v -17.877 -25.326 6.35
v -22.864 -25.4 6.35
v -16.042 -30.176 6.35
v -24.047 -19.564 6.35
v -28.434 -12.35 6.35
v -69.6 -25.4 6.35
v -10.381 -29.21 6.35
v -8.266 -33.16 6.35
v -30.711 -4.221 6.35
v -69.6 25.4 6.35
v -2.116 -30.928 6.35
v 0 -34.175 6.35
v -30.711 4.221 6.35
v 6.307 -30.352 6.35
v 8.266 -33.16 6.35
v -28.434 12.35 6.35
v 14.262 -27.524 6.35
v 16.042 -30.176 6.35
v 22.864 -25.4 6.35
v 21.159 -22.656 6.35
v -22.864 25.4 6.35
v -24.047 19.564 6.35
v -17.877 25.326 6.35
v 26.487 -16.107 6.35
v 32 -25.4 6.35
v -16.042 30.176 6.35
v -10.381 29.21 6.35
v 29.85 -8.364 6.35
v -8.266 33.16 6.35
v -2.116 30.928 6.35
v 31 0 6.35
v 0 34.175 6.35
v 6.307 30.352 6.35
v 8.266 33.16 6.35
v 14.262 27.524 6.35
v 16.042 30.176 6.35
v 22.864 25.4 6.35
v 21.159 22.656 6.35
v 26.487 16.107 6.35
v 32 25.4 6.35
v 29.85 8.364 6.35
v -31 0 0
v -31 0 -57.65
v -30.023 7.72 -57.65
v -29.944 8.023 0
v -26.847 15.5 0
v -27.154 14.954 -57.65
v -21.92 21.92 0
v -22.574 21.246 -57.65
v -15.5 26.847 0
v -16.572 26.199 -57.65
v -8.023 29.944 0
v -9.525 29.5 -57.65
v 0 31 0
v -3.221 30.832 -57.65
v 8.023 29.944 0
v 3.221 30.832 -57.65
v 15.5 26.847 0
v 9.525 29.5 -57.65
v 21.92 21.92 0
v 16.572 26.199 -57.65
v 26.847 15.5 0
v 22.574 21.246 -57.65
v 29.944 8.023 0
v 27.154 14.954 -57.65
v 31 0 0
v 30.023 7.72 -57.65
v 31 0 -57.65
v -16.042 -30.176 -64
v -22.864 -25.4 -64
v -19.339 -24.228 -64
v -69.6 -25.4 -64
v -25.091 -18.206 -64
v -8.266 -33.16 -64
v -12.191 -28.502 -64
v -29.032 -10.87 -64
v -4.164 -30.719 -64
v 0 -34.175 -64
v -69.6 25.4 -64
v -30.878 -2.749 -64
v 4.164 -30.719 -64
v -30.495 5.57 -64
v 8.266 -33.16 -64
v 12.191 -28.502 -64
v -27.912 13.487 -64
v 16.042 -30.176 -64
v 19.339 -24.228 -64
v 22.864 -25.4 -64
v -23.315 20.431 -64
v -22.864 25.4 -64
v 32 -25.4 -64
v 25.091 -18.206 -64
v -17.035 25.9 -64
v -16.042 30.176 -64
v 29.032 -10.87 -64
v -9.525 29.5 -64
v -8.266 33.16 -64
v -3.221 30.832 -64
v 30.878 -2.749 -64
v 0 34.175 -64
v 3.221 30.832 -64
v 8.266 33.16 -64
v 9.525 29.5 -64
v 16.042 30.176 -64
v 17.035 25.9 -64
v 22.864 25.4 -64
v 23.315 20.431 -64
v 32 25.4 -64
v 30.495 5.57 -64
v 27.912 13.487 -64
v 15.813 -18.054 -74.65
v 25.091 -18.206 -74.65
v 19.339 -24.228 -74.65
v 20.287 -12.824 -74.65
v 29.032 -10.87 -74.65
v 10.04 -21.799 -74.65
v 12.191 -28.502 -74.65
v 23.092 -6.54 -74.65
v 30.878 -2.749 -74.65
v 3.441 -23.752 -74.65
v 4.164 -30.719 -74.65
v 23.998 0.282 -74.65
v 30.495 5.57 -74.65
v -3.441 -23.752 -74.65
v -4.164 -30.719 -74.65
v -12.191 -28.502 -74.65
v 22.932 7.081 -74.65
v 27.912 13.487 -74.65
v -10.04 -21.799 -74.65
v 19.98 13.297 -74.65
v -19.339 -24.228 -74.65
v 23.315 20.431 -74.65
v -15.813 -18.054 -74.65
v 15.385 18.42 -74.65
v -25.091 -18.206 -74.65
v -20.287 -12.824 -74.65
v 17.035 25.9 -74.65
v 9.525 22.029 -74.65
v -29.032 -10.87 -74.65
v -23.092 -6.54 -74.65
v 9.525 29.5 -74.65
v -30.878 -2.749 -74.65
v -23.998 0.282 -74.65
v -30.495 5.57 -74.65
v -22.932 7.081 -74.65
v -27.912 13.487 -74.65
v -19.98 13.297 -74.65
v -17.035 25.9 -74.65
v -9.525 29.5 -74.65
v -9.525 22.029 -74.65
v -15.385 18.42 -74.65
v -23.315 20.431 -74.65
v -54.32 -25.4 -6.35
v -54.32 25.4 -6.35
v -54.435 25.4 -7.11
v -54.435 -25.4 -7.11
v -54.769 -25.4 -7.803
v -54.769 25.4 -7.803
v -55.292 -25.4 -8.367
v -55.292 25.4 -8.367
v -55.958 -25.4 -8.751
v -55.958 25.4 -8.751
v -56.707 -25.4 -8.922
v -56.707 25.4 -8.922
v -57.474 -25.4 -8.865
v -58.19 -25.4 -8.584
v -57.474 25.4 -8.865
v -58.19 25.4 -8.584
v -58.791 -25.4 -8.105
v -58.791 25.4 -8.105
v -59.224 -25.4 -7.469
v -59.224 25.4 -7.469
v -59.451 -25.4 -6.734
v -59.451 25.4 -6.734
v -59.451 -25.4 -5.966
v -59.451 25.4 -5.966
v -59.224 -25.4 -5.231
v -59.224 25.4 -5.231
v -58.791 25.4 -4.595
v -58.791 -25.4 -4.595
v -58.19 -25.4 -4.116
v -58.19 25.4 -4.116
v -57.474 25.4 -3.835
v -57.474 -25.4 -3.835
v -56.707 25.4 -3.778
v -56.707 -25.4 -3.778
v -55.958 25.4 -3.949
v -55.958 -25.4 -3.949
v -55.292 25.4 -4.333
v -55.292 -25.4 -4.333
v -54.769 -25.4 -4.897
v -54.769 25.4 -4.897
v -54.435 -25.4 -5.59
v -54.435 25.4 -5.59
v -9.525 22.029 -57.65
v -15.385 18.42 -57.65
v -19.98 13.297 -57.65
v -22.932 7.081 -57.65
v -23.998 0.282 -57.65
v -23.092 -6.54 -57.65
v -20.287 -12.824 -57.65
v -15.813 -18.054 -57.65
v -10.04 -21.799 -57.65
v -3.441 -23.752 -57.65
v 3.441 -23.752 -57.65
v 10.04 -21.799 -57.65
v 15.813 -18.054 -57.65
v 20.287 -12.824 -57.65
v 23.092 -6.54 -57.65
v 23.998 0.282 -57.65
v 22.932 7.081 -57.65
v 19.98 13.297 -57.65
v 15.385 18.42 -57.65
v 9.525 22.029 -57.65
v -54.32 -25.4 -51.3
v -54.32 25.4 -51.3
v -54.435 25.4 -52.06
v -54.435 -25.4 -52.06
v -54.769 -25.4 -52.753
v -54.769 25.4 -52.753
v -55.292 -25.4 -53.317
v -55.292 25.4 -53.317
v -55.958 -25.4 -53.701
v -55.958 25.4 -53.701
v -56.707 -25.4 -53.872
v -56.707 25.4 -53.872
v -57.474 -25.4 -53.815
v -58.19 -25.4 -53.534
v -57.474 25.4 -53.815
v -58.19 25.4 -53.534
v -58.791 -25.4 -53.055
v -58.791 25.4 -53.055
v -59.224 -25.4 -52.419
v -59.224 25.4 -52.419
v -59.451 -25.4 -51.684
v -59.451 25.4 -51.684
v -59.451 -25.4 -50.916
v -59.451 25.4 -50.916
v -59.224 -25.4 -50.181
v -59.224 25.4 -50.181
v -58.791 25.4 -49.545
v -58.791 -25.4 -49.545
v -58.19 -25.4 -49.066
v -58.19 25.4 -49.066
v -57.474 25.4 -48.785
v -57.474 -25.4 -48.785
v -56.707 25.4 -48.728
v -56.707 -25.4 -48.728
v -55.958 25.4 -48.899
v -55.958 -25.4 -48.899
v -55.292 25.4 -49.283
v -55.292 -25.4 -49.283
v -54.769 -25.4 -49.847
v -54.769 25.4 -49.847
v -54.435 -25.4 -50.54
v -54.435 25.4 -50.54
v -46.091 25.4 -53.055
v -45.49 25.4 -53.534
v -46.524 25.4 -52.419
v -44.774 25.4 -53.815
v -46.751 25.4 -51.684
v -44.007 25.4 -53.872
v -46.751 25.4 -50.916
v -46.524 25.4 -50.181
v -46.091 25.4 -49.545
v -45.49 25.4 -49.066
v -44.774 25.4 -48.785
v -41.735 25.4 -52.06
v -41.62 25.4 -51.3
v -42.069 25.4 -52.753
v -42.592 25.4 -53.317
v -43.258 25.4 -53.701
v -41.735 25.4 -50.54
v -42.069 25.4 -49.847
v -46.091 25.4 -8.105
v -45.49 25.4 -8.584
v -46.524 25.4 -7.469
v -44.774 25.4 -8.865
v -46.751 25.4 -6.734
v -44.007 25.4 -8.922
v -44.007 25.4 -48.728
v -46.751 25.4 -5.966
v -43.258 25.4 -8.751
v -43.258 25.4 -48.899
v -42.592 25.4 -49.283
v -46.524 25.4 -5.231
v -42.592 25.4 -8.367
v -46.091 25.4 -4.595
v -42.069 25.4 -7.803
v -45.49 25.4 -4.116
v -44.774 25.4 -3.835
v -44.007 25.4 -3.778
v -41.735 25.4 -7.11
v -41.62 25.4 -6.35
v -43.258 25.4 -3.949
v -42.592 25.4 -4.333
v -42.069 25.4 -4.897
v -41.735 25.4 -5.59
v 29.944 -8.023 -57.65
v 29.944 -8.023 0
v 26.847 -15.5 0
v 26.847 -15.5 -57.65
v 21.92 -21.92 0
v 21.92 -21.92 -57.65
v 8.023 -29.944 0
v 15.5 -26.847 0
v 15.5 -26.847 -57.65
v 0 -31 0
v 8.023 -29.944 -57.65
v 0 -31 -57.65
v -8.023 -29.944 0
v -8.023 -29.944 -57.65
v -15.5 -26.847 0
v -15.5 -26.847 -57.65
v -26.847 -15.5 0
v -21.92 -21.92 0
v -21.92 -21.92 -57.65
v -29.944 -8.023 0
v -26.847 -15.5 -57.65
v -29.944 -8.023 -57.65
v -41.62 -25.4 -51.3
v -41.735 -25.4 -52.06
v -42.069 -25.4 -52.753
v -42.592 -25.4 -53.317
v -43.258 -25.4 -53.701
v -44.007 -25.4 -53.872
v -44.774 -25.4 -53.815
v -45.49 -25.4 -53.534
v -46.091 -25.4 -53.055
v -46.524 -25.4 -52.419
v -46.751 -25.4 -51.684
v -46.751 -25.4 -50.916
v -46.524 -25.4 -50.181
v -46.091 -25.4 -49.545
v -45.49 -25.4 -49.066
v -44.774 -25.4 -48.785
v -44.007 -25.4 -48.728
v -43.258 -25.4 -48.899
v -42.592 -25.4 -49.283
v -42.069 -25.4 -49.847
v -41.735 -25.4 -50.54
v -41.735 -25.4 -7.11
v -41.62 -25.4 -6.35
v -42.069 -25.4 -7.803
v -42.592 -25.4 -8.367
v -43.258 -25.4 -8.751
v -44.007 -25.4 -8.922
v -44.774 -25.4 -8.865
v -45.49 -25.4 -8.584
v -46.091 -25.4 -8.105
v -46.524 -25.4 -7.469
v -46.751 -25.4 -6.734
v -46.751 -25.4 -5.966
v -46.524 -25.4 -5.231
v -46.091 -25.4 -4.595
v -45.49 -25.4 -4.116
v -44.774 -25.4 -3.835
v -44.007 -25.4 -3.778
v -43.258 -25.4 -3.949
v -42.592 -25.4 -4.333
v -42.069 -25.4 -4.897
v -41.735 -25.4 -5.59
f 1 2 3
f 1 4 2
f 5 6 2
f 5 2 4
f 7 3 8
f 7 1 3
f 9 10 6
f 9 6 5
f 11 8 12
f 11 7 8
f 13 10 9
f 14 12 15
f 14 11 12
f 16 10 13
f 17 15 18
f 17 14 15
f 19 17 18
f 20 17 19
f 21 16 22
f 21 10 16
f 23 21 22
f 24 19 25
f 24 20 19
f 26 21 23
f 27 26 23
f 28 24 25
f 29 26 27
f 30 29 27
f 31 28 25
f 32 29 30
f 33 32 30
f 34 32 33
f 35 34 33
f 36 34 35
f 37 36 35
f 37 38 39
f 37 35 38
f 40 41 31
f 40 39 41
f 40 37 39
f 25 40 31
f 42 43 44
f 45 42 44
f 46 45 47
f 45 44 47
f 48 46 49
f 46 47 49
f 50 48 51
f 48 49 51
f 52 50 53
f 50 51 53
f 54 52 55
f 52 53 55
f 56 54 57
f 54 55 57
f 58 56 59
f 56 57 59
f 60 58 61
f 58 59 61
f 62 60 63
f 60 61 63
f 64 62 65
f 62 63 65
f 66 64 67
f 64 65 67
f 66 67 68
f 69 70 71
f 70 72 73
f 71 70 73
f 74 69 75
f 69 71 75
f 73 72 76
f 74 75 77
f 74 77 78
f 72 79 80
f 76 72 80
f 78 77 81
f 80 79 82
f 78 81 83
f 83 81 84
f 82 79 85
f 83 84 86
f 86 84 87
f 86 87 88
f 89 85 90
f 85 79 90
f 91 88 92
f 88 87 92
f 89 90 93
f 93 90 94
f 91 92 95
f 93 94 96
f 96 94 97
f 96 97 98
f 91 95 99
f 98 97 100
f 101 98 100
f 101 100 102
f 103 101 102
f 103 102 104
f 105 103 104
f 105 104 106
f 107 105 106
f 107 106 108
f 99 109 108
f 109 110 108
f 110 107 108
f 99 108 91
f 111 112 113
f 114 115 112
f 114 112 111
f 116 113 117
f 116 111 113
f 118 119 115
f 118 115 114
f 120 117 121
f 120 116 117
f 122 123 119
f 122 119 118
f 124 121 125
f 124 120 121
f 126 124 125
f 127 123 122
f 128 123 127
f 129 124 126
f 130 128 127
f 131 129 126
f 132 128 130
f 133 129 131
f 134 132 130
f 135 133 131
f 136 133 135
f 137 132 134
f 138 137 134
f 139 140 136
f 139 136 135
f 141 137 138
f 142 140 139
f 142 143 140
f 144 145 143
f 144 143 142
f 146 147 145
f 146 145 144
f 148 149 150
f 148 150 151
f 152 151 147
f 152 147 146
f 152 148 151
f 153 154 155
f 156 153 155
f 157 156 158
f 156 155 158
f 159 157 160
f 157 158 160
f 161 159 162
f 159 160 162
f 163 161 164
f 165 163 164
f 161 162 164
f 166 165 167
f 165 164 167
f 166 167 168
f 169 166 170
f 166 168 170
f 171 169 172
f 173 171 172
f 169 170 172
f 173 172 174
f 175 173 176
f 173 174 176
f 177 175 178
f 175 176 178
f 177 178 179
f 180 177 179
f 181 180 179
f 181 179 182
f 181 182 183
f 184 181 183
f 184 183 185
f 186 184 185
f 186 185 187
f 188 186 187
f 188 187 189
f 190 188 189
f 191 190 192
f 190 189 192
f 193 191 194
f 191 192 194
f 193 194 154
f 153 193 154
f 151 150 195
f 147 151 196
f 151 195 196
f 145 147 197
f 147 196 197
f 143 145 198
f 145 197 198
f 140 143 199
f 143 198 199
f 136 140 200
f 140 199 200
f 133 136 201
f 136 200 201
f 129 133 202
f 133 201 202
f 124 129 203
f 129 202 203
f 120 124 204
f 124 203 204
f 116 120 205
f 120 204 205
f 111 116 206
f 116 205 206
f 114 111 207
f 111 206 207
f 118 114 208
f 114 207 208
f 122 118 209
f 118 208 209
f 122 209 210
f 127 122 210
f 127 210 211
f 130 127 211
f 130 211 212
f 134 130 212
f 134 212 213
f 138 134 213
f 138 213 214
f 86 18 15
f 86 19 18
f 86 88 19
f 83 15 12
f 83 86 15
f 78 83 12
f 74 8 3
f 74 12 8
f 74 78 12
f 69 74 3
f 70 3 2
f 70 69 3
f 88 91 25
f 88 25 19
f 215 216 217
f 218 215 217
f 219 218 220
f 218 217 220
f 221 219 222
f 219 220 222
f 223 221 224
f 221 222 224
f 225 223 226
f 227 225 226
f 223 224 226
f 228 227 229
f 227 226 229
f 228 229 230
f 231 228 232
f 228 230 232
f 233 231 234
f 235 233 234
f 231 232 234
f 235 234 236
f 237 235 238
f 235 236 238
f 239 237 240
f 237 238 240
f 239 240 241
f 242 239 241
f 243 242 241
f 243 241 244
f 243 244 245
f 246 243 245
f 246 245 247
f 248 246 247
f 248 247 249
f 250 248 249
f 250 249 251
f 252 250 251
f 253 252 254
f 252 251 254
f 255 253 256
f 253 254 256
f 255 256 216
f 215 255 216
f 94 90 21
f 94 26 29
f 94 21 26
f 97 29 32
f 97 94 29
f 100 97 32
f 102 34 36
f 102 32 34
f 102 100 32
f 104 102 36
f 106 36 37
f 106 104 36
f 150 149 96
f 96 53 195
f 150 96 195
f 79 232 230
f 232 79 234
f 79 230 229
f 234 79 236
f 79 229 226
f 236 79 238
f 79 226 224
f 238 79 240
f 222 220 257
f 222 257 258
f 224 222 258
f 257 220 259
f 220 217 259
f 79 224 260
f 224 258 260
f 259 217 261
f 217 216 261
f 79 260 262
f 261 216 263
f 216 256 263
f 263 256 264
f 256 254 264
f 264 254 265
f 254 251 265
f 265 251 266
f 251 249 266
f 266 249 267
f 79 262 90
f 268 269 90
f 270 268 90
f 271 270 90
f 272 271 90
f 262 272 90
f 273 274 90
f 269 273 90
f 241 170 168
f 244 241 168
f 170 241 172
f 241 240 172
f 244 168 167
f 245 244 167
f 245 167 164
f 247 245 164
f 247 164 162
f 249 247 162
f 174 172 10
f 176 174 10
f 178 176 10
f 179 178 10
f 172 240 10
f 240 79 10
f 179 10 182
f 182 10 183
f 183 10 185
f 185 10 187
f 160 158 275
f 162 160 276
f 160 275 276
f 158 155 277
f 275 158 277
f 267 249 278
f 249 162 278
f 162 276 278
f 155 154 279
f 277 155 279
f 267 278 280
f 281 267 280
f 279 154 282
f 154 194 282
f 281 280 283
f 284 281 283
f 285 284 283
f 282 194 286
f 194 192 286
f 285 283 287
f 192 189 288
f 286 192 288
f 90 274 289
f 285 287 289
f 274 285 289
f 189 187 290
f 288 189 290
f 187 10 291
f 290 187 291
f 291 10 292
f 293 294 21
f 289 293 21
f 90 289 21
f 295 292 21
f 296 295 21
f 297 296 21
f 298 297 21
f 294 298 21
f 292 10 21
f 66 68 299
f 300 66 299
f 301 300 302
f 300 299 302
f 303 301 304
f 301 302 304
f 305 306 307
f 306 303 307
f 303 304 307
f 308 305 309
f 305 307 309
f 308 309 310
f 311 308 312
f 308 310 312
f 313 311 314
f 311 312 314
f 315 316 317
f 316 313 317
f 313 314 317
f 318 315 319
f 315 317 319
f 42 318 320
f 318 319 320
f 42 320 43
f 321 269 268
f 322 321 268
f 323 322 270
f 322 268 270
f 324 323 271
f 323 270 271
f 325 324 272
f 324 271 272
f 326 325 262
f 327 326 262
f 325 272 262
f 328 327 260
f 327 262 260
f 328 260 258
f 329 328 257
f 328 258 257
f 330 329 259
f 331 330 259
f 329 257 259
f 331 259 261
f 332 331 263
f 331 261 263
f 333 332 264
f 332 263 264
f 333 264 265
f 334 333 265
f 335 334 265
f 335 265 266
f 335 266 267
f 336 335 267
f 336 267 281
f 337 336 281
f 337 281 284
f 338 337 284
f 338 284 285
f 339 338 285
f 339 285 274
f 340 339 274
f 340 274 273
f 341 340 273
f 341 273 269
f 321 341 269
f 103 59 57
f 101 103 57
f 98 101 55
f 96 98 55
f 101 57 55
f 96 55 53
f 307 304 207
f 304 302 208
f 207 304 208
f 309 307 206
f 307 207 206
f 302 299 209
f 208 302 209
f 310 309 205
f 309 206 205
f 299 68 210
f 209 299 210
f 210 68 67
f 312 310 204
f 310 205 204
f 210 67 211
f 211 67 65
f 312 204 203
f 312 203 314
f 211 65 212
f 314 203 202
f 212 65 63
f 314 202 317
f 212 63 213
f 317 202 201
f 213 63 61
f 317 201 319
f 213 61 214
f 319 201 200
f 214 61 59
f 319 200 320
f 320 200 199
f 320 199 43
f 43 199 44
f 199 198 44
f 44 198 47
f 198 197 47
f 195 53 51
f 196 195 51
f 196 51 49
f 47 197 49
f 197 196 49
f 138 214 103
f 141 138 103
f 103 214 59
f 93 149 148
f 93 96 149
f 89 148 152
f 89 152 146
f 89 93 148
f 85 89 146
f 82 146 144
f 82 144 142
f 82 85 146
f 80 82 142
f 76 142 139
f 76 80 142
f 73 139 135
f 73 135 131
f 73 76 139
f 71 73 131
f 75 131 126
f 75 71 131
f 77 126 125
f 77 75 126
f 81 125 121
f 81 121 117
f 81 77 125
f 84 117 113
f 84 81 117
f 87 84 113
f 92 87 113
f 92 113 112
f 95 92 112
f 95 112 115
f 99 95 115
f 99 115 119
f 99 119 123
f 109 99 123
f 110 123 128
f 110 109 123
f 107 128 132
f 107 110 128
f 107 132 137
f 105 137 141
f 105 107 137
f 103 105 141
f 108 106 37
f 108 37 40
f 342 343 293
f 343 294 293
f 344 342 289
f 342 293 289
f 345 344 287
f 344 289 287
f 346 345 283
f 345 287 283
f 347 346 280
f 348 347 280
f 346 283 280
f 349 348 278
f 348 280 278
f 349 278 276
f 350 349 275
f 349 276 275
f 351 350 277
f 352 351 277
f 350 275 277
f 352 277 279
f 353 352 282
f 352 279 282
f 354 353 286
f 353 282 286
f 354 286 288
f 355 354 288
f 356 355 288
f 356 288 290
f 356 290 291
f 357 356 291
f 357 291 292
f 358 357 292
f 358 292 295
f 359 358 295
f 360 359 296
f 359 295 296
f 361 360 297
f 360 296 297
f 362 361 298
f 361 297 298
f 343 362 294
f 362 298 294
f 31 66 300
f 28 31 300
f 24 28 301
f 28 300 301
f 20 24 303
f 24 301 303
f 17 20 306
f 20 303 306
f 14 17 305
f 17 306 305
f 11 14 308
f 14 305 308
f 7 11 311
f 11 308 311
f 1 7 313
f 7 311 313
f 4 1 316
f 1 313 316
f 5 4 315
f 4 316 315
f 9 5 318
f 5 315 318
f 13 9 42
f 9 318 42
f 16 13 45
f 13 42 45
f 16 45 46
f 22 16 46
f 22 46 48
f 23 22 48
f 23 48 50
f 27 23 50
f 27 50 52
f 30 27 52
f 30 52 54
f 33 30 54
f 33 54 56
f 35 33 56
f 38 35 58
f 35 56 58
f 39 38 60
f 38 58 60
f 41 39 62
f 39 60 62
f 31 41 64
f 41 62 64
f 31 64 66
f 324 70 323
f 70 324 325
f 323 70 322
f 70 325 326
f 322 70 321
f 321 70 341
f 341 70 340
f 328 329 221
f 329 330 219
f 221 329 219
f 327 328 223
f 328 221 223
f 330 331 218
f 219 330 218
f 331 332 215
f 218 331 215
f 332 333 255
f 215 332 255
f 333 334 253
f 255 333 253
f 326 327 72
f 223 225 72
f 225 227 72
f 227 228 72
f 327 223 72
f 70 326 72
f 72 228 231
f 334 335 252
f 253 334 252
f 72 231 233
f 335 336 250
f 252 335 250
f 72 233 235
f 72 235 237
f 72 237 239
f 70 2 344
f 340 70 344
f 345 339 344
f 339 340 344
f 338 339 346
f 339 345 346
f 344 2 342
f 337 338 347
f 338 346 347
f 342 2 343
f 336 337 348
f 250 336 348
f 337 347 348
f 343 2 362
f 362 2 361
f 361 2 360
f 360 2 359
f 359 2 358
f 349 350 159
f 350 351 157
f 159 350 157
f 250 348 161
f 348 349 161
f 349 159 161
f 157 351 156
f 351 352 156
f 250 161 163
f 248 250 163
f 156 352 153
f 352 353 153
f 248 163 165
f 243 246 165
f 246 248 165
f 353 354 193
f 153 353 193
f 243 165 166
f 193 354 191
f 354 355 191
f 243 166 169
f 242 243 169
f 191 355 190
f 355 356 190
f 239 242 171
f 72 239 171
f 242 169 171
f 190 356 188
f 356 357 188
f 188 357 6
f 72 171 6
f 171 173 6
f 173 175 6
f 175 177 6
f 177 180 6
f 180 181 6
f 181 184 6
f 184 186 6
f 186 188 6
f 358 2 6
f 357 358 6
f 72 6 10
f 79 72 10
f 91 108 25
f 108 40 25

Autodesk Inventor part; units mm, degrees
ref_plane "YZ Plane" through (0, 0, 0) normal (1, 0, 0) x (0, 1, 0)
ref_plane "XZ Plane" through (0, 0, 0) normal (0, 1, 0) x (-1, 0, 0)
ref_plane "XY Plane" through (0, 0, 0) normal (0, 0, 1) x (1, 0, 0)
sketch "Sketch1" plane through (0, 0, 0) normal (0, 0, 1) x (1, 0, 0)
  circle A0 centre (0, 0) radius 31
  circle A1 centre (0, 0) radius 34.175
  dimension "d0" = 62
  dimension "d1" = 68.35
extrude "Extrusion1" add sketch "Sketch1" along normal blind 6.35
ref_plane "Work Plane1" through (0, 0, -83.5) normal (0, 0, -1) x (-1, 0, 0)
sketch "Sketch2" plane through (0, 0, -83.5) normal (0, 0, -1) x (-1, 0, 0)
  circle A0 centre (0, 0) radius 30
  circle A1 centre (0, 0) radius 33.175
  circle A2 centre (0, 0) radius 23
  circle A3 centre (0, 0) radius 26.175
  dimension "d5" = 60
  dimension "d6" = 66.35
  dimension "d28" = 46
  dimension "d29" = 52.35
ref_plane "Work Plane2" through (0, 0, -57.65) normal (0, 0, -1) x (-1, 0, 0)
sketch "Sketch3" plane through (0, 0, -57.65) normal (0, 0, -1) x (-1, 0, 0)
  circle A0 centre (0, 0) radius 34.175
  circle A1 centre (0, 0) radius 31
  circle A2 centre (0, 0) radius 24
  circle A3 centre (0, 0) radius 27.175
  line L0 (0, 0) -> (34.175, 0)
  line L1 (0, 0) -> (34.175, 0) construction
  line L2 (0, 0) -> (33.8826, 4.4607)
  line L3 (0, 0) -> (33.8826, -4.4607)
  line L4 (33.8826, 4.4607) -> (33.8826, -4.4607)
  line L5 (33.8826, -4.4607) -> (0, -4.4607)
  line L6 (0, -4.4607) -> (0, 4.4607)
  line L7 (0, 4.4607) -> (33.8826, 4.4607)
  line L8 (33.8826, 4.4607) -> (33.8826, -4.4607)
  line L9 (33.8826, -4.4607) -> (37.0576, -4.4607)
  line L10 (37.0576, -4.4607) -> (37.0576, 4.4607)
  line L11 (37.0576, 4.4607) -> (33.8826, 4.4607)
  line L12 (-3.8631, 2.2304) -> (13.0782, 31.5736)
  line L13 (20.8044, 27.1129) -> (3.8631, -2.2304)
  line L14 (20.8044, 27.1129) -> (22.3919, 29.8625)
  line L15 (14.6657, 34.3232) -> (13.0782, 31.5736)
  line L16 (-3.8631, -2.2304) -> (-20.8044, 27.1129)
  line L17 (-13.0782, 31.5736) -> (3.8631, 2.2304)
  line L18 (-13.0782, 31.5736) -> (-14.6657, 34.3232)
  line L19 (-22.3919, 29.8625) -> (-20.8044, 27.1129)
  line L20 (0, -4.4607) -> (-33.8826, -4.4607)
  line L21 (-33.8826, 4.4607) -> (0, 4.4607)
  line L22 (-33.8826, 4.4607) -> (-37.0576, 4.4607)
  line L23 (-37.0576, -4.4607) -> (-33.8826, -4.4607)
  line L24 (3.8631, -2.2304) -> (-13.0782, -31.5736)
  line L25 (-20.8044, -27.1129) -> (-3.8631, 2.2304)
  line L26 (-20.8044, -27.1129) -> (-22.3919, -29.8625)
  line L27 (-14.6657, -34.3232) -> (-13.0782, -31.5736)
  line L28 (3.8631, 2.2304) -> (20.8044, -27.1129)
  line L29 (13.0782, -31.5736) -> (-3.8631, -2.2304)
  line L30 (13.0782, -31.5736) -> (14.6657, -34.3232)
  line L31 (22.3919, -29.8625) -> (20.8044, -27.1129)
  line L32 (-34.175, 6.35) -> (0, 6.35)
  line L33 (0, 6.35) -> (0, -6.35)
  line L34 (0, -6.35) -> (-34.175, -6.35)
  line L35 (-34.175, -6.35) -> (-34.175, 6.35)
  line L36 (-9.525, 34.175) -> (9.525, 34.175)
  line L37 (9.525, 34.175) -> (9.525, 0)
  line L38 (9.525, 0) -> (-9.525, 0)
  line L39 (-9.525, 0) -> (-9.525, 34.175)
  point P0 (-26.8064, 4.4607)
  point P1 (-33.8826, 4.4607)
  point P2 (-33.8826, -4.4607)
  point P3 (-26.8064, -4.4607)
  point P4 (-17.2663, -20.9846)
  point P5 (-20.8044, -27.1129)
  point P6 (-13.0782, -31.5736)
  point P7 (-9.5401, -25.4454)
  point P8 (9.5401, -25.4454)
  point P9 (20.8044, -27.1129)
  point P10 (17.2663, -20.9846)
  point P11 (26.8064, -4.4607)
  point P12 (26.8064, 4.4607)
  point P13 (17.2663, 20.9846)
  point P14 (20.8044, 27.1129)
  point P15 (13.0782, 31.5736)
  point P16 (9.5401, 25.4454)
  point P17 (-13.0782, 31.5736)
  point P18 (-20.8044, 27.1129)
  point P19 (-17.2663, 20.9846)
  point P20 (-9.5401, 25.4454)
  point P21 (-34.175, 0)
  point P22 (0, 0)
  point P23 (0, 0)
  point P24 (-7.9278, 22.6528)
  point P25 (-9.525, 25.4192)
  point P26 (-9.525, 29.5004)
  point P27 (9.525, 29.5004)
  point P28 (9.525, 25.4192)
  point P29 (7.9278, 22.6528)
  point P30 (-9.525, 22.0289)
  point P31 (9.525, 22.0289)
  dimension "d8" = 68.35
  dimension "d9" = 62
  dimension "d10" = 48
  dimension "d11" = 54.35
  dimension "d12" = 0
  dimension "d13" = 7.5
  dimension "d14" = 7.5
  dimension "d15" = 3.175
  dimension "d18" = 360
  dimension "d70" = 12.7
  dimension "d71" = 19.05
  dimension "d72" = 9.525
extrude "Extrusion2" add sketch "Sketch3" against normal up to surface (57.65 mm away) contours L0 L4 A0 | A0 L4 L0 | L7 A1 L13 A0 | L4 L0 A1 L2 | L2 A1 L7 | L5 A1 L3 | L3 A1 L0 L4 | A0 L28 A1 L5 | L13 A1 L12 A0 | A0 L29 A1 L28 | L12 A1 L37 A0 | A0 L24 A1 L29 | L37 A1 L39 A0 | A0 L25 A1 L24 | A0 L34 A1 L25 | L39 A1 L17 A0 | A0 L20 A1 L34 | L17 A1 L16 A0 | A0 L21 A1 L20 | L16 A1 L32 A0 | L32 A1 L21 A0
extrude "Extrusion3" add sketch "Sketch3" along normal blind 17 contours L2 A3 L7 A1 | A1 L0 A3 L2 | L7 A3 L13 A1 | L3 A3 L0 A1 | A1 L5 A3 L3 | A1 L28 A3 L5 | L13 A3 L12 A1 | L2 A2 L7 A3 | A3 L0 A2 L2 | L7 A2 L13 A3 | A1 L29 A3 L28 | L3 A2 L0 A3 | A3 L5 A2 L3 | A3 L28 A2 L5 | L12 A3 L37 A1 | L13 A2 L37 L12 A3 | A1 L24 A3 L29 | A3 L29 A2 L28 | L12 L37 A3 | A1 L25 A3 L24 | A3 L24 A2 L29 | L39 A3 L17 A1 | A1 L34 A3 L25 | A3 L25 A2 L24 | L17 A3 L16 A1 | L39 L17 A3 | A1 L20 A3 L34 | A3 L34 A2 L25 | L16 A3 L32 A1 | L17 L39 A2 L16 A3 | A1 L21 A3 L20 | A3 L20 A2 L34 | L32 A3 L21 A1 | L16 A2 L32 A3 | A3 L21 A2 L20 | L32 A2 L21 A3
extrude "Extrusion5" add sketch "Sketch3" along normal blind 6.35 contours L0 L4 A0 | A0 L4 L0 | L7 A1 L13 A0 | L4 L0 A1 L2 | L2 A1 L7 | L5 A1 L3 | L3 A1 L0 L4 | A0 L28 A1 L5 | L13 A1 L12 A0 | A0 L29 A1 L28 | L12 A1 L37 A0 | A0 L24 A1 L29 | L37 A1 L39 A0 | A0 L25 A1 L24 | A0 L34 A1 L25 | L39 A1 L17 A0 | A0 L20 A1 L34 | L17 A1 L16 A0 | A0 L21 A1 L20 | L16 A1 L32 A0 | L32 A1 L21 A0
sketch "Sketch4" plane through (0, 0, 6.35) normal (0, 0, 1) x (1, 0, 0)
  circle A0 centre (0, 0) radius 32
  line L0 (32, 25.4) -> (32, -25.4)
  line L1 (32, -25.4) -> (-69.6, -25.4)
  line L2 (-69.6, -25.4) -> (-69.6, 25.4)
  line L3 (-69.6, 25.4) -> (32, 25.4)
  circle A1 centre (0, 0) radius 31
  circle A2 centre (0, 0) radius 31 projected
  circle A3 centre (0, 0) radius 34.175
  circle A4 centre (0, 0) radius 34.175 projected
  point P0 (22.8642, 25.4)
  point P1 (-22.8642, 25.4)
  point P2 (-22.8642, -25.4)
  point P3 (22.8642, -25.4)
  point P4 (32, 11.9971)
  point P5 (32, -11.9971)
  dimension "d41" = 64
  dimension "d42" = 25.4
  dimension "d43" = 50.8
  dimension "d44" = 101.6
extrude "Extrusion7" add sketch "Sketch4" against normal up to surface (70.35 mm away) contours A0 L1 A1 L3 | L0 A3 L1 A0 | A0 L3 A3 L0 | L3 A1 A0 | A0 L3 A3 | L1 A3 A0 | A0 L1 A1 | A3 L3 L0 | L0 L1 A3 | L3 A1 L1 A0 | A0 L1 A3 L3 | A3 L1 L2 L3
extrude "Extrusion8" cut sketch "Sketch4" against normal through all contours L0 A3
sketch "Sketch8" plane through (-69.6, 25.4, 6.35) normal (0, 1, 0) x (1, 0, 0)
  circle A0 centre (12.7, 12.7) radius 2.5797
  line L0 (0, 0) -> (0, 70.35) projected
  line L1 (0, 0) -> (12.7, 0)
  line L2 (0, 0) -> (12.7, 0) construction
  line L3 (0, 0) -> (0, 12.7)
  line L4 (0, 0) -> (12.7, 0) construction
  circle A1 centre (25.4, 12.7) radius 2.5797
  circle A2 centre (12.7, 57.65) radius 2.5797
  circle A3 centre (25.4, 57.65) radius 2.5797
  line L5 (46.7358, 0) -> (0, 0) projected
  line L6 (46.7358, 70.35) -> (0, 70.35) projected
  point P0 (69.6, 6.35)
  dimension "d73" = 12.7
  dimension "d74" = 0
  dimension "d75" = 12.7
  dimension "d76" = 90
  dimension "d79" = 12.7
  dimension "d82" = 44.95
  dimension "d85" = 5.1594
  dimension "d86" = 12.7
  dimension "d87" = 12.7
  dimension "d88" = 12.7
extrude "Extrusion11" cut sketch "Sketch8" against normal through all
equation "\"d14\" = d13"
equation "\"d72\" = 0.5 * d71"
equation "\"d42\" = 0.5 * d43"
